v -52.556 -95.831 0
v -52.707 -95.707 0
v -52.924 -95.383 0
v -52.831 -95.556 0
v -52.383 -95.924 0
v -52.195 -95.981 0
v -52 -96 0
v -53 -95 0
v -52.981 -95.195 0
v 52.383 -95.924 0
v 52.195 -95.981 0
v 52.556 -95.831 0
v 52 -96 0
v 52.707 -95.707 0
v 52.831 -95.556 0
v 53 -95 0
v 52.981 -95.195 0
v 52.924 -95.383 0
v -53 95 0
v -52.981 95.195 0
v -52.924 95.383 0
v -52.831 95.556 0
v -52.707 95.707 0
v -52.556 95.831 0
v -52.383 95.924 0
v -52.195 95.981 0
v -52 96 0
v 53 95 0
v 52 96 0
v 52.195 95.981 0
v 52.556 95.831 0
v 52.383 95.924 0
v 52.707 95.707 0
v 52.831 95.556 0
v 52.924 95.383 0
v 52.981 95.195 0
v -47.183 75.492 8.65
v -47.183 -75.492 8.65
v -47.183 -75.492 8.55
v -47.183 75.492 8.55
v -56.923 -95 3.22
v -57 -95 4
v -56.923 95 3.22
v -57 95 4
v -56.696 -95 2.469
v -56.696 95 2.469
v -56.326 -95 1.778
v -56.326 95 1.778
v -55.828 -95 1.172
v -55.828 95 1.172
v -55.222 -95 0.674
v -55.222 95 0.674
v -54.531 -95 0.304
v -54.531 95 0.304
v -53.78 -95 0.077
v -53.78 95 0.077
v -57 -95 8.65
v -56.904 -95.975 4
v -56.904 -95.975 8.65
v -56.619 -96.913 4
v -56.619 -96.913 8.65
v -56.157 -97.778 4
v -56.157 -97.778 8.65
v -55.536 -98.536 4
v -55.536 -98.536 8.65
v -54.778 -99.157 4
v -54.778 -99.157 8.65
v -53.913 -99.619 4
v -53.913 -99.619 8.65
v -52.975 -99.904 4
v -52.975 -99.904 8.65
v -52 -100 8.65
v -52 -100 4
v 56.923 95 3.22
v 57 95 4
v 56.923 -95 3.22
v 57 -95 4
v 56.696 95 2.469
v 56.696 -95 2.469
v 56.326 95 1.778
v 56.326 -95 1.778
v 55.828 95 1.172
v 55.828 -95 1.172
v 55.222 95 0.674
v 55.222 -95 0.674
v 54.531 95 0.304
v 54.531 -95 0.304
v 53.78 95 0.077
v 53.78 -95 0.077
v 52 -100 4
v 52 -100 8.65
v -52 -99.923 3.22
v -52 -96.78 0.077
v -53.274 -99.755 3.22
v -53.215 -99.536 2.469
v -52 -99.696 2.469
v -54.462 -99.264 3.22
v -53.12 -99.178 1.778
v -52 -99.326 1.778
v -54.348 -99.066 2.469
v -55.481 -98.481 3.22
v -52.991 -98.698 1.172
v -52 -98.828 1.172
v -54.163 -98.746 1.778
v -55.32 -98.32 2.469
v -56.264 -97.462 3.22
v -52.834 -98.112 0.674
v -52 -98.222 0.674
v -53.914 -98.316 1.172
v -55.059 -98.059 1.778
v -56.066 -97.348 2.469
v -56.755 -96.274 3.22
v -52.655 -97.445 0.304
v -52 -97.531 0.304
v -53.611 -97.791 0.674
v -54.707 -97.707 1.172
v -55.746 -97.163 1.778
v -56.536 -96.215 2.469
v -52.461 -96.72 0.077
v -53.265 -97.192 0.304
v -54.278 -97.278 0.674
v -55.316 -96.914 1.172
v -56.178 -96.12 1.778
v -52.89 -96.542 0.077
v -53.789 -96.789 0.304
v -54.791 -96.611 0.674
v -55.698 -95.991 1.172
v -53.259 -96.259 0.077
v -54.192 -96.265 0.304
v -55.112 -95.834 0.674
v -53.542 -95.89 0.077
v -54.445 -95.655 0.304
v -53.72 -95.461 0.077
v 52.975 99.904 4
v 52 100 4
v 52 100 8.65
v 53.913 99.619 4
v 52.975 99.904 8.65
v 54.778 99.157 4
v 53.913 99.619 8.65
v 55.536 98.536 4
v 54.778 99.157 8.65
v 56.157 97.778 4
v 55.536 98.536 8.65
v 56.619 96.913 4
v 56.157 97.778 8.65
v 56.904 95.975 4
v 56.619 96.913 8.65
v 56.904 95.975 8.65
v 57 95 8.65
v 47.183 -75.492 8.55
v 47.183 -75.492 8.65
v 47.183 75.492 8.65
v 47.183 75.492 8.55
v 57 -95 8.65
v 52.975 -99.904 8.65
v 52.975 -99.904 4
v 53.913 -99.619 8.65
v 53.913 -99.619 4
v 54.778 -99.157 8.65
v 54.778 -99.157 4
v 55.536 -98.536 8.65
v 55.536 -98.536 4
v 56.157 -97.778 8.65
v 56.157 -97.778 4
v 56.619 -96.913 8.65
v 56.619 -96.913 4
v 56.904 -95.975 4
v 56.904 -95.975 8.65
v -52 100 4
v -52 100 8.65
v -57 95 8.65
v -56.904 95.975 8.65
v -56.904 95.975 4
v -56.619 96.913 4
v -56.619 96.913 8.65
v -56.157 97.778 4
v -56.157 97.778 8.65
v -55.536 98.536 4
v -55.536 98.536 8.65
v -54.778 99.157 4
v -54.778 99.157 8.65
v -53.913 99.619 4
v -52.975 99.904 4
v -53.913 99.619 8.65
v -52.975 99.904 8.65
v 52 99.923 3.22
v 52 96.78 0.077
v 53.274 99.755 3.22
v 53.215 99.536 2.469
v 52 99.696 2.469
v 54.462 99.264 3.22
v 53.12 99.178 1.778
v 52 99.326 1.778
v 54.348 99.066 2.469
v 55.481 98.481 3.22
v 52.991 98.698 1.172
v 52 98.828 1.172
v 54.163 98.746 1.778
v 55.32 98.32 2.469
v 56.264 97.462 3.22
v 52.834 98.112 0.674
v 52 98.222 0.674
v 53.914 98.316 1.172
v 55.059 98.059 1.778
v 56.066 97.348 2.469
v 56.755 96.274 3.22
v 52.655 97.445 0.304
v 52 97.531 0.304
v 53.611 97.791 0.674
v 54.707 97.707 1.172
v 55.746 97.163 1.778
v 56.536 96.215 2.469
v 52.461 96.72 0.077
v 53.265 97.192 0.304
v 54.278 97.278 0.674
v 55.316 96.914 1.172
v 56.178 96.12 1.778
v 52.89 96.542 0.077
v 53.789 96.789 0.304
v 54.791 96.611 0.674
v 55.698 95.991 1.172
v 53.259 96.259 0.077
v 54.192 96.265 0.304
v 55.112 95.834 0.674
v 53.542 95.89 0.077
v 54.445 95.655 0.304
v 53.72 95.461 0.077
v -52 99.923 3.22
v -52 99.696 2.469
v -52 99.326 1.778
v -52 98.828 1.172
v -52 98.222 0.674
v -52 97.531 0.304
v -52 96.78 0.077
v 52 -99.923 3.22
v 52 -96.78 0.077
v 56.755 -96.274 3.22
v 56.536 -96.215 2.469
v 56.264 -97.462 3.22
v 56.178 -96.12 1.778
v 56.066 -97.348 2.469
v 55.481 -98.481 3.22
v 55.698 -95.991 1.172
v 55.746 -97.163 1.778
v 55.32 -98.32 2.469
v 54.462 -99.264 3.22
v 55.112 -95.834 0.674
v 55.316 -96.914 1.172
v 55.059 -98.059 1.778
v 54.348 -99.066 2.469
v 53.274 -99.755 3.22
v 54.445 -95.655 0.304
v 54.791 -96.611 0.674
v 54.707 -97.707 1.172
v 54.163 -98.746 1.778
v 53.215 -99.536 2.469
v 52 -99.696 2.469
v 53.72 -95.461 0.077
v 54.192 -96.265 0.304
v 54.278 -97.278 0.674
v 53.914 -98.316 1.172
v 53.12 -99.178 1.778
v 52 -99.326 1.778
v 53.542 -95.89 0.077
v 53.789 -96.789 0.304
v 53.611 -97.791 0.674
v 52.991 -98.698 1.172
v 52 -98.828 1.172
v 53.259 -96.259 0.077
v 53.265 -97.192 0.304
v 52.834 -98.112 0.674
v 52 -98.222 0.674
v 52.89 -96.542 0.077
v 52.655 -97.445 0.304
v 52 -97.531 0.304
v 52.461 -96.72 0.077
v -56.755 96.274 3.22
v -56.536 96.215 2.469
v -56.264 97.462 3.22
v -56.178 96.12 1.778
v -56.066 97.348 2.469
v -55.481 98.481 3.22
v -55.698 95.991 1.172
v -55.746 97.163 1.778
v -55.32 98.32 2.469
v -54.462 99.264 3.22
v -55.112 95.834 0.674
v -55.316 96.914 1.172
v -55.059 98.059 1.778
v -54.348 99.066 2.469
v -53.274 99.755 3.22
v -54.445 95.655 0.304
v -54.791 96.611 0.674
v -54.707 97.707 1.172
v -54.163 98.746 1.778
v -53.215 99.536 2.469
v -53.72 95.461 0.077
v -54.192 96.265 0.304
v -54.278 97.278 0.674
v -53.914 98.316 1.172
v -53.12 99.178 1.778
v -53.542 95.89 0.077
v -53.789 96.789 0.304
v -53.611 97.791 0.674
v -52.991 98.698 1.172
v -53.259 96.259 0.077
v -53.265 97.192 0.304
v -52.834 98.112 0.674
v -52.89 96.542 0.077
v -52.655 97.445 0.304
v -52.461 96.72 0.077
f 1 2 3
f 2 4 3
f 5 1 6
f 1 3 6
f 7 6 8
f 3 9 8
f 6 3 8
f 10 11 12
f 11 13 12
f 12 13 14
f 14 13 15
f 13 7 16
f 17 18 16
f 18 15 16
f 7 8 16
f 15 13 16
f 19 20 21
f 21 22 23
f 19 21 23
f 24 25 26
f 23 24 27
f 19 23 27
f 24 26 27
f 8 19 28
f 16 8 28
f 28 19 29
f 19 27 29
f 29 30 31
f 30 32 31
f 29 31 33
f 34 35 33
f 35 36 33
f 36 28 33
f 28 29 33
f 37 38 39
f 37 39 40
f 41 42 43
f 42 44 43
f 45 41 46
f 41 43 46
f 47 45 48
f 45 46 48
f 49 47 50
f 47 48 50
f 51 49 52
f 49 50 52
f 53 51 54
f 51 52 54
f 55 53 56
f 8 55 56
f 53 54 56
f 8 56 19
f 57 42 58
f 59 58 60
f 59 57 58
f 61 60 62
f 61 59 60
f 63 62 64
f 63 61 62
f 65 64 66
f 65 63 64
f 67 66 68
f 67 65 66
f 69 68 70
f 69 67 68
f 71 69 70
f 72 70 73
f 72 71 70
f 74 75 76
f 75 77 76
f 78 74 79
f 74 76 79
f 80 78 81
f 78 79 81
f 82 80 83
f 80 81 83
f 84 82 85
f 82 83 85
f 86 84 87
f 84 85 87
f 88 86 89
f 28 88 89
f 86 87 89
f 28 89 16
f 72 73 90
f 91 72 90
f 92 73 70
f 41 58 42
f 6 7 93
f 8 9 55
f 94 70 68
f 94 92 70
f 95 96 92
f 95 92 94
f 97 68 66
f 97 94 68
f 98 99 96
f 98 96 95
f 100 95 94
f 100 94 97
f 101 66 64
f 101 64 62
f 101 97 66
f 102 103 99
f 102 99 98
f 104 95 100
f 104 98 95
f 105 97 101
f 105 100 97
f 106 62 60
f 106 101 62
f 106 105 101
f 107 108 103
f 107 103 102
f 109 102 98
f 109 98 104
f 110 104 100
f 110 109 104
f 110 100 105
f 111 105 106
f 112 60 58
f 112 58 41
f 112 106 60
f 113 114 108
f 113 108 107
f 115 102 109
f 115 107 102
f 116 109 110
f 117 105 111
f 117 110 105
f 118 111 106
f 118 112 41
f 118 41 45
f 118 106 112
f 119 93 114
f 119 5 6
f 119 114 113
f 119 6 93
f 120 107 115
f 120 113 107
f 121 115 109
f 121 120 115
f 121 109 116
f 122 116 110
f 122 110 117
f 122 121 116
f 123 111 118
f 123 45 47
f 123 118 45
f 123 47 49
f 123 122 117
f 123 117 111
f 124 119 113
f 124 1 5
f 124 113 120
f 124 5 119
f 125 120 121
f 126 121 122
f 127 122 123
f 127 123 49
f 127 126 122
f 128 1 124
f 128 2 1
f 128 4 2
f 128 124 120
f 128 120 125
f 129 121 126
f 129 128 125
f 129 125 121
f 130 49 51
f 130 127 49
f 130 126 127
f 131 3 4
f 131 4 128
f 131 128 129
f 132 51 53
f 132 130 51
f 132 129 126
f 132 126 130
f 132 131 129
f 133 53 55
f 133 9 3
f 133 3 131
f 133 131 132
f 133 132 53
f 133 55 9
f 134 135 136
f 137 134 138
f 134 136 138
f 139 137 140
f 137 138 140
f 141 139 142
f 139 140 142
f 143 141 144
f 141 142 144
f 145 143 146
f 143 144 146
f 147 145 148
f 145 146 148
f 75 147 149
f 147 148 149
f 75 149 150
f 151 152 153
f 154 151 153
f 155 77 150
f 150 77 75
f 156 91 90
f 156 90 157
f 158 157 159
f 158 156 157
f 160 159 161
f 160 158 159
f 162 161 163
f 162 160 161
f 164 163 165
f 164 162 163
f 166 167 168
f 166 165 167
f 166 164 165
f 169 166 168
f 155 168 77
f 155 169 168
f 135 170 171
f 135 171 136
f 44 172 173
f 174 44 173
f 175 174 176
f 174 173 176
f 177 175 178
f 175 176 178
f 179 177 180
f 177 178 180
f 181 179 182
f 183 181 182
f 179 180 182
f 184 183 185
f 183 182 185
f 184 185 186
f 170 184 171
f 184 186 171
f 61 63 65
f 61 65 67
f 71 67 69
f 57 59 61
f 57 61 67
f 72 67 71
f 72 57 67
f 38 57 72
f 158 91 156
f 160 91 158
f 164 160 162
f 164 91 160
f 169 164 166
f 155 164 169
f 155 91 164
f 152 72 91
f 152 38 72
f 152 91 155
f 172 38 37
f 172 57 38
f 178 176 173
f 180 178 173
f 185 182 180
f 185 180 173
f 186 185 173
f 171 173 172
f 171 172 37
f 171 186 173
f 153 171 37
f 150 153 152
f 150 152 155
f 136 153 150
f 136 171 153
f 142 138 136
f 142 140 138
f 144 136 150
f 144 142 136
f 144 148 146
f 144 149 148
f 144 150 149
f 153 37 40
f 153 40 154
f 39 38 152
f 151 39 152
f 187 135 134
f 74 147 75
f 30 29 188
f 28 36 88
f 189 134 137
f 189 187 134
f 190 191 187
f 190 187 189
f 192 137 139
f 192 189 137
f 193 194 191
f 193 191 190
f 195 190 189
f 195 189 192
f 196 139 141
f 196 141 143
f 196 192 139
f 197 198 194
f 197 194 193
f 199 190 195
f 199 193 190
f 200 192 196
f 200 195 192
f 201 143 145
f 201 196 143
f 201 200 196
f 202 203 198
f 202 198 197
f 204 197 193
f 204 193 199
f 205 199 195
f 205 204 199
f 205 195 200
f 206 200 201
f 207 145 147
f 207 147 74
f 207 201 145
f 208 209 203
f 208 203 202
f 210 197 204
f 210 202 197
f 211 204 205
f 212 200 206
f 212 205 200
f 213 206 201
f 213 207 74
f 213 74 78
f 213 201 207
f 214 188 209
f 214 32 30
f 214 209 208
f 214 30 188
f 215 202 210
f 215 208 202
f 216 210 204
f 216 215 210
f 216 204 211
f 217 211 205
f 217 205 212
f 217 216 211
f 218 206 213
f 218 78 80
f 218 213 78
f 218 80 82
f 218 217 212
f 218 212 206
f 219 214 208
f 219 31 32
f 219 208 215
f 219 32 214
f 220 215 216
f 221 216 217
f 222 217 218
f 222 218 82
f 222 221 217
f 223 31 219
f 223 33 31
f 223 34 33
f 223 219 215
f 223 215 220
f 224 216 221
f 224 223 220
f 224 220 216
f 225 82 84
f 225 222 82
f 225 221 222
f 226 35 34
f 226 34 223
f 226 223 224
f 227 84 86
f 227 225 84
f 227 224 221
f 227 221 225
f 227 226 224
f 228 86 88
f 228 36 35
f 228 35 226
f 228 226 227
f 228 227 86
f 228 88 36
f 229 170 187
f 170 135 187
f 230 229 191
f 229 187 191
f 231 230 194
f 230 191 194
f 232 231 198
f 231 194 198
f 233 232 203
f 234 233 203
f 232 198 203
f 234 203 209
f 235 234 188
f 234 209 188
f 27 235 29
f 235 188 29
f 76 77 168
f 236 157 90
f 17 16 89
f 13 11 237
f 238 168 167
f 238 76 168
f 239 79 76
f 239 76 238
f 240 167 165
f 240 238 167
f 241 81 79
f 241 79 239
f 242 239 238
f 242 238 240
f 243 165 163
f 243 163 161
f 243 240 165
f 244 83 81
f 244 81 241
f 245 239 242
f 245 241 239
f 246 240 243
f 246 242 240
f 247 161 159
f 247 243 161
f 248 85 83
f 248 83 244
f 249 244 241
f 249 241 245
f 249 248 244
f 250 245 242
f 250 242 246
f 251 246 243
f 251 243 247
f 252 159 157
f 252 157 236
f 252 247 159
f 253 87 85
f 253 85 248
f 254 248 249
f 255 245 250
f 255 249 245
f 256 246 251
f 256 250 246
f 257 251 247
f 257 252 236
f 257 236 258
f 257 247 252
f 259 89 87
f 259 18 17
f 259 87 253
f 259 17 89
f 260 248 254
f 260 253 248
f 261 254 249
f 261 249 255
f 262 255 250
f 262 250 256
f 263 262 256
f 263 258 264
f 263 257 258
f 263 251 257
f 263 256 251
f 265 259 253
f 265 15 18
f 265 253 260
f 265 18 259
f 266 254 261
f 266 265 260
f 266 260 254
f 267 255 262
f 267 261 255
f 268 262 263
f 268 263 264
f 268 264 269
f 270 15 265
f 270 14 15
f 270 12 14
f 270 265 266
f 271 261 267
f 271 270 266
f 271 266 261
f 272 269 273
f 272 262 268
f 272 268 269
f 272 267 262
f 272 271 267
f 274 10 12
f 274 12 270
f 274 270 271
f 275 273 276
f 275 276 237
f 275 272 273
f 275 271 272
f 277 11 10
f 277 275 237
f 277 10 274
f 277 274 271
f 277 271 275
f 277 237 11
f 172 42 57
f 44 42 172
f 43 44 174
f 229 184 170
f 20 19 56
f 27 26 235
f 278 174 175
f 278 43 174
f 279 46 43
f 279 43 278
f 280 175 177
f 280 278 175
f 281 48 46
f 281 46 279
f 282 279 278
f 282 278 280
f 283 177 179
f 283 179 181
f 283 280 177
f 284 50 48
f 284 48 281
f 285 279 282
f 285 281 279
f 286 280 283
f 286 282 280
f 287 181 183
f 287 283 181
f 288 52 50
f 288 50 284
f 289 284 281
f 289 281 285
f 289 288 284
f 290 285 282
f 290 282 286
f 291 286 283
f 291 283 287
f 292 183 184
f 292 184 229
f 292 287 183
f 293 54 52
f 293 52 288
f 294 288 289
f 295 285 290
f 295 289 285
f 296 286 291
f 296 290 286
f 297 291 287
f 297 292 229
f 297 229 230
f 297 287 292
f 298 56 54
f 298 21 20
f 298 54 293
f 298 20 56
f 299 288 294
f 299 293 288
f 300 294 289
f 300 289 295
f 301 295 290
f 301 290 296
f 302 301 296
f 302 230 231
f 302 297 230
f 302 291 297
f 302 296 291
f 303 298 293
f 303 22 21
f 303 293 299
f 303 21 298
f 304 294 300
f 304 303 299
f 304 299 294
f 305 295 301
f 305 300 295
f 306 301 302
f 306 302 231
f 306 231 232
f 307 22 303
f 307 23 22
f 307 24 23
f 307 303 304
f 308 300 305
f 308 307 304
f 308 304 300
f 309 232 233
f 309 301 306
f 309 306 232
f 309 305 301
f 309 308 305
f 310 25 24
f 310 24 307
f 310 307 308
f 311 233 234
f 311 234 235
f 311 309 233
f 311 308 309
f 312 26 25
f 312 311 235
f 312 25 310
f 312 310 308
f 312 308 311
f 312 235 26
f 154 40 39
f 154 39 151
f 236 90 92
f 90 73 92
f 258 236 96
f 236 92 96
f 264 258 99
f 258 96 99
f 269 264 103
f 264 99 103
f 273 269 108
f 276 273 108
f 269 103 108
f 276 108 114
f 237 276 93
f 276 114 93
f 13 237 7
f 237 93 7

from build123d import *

# Parameters (mm, degrees)
F1_W     = 114
F1_H     = 200
F2_DEPTH = 8.65
F3_W     = 94.3653250774
F3_H     = 150.9845201238
F4_DEPTH = 0.1
F5_R     = 5
F6_R     = 4


with BuildPart() as f2:
    # F1 (on Top) → F2 (new body)
    with BuildSketch(Plane.XY):
        Rectangle(F1_W, F1_H)
    extrude(amount=F2_DEPTH)

    # F3 (on face) → F4 (cut)
    with BuildSketch(Plane.XY.offset(8.65)):
        Rectangle(F3_W, F3_H)
    extrude(amount=-F4_DEPTH, mode=Mode.SUBTRACT)

    # F5
    f5_edges = [f2.edges().sort_by_distance(p)[0] for p in [
        (-57, -100, 4.325),
        (57, -100, 4.325),
        (-57, 100, 4.325),
        (57, 100, 4.325),
    ]]
    fillet(f5_edges, radius=F5_R)

    # F6
    f6_edges = [f2.edges().sort_by_distance(p)[0] for p in [
        (-57, 0, 0),
    ]]
    fillet(f6_edges, radius=F6_R)


solid = f2.part
